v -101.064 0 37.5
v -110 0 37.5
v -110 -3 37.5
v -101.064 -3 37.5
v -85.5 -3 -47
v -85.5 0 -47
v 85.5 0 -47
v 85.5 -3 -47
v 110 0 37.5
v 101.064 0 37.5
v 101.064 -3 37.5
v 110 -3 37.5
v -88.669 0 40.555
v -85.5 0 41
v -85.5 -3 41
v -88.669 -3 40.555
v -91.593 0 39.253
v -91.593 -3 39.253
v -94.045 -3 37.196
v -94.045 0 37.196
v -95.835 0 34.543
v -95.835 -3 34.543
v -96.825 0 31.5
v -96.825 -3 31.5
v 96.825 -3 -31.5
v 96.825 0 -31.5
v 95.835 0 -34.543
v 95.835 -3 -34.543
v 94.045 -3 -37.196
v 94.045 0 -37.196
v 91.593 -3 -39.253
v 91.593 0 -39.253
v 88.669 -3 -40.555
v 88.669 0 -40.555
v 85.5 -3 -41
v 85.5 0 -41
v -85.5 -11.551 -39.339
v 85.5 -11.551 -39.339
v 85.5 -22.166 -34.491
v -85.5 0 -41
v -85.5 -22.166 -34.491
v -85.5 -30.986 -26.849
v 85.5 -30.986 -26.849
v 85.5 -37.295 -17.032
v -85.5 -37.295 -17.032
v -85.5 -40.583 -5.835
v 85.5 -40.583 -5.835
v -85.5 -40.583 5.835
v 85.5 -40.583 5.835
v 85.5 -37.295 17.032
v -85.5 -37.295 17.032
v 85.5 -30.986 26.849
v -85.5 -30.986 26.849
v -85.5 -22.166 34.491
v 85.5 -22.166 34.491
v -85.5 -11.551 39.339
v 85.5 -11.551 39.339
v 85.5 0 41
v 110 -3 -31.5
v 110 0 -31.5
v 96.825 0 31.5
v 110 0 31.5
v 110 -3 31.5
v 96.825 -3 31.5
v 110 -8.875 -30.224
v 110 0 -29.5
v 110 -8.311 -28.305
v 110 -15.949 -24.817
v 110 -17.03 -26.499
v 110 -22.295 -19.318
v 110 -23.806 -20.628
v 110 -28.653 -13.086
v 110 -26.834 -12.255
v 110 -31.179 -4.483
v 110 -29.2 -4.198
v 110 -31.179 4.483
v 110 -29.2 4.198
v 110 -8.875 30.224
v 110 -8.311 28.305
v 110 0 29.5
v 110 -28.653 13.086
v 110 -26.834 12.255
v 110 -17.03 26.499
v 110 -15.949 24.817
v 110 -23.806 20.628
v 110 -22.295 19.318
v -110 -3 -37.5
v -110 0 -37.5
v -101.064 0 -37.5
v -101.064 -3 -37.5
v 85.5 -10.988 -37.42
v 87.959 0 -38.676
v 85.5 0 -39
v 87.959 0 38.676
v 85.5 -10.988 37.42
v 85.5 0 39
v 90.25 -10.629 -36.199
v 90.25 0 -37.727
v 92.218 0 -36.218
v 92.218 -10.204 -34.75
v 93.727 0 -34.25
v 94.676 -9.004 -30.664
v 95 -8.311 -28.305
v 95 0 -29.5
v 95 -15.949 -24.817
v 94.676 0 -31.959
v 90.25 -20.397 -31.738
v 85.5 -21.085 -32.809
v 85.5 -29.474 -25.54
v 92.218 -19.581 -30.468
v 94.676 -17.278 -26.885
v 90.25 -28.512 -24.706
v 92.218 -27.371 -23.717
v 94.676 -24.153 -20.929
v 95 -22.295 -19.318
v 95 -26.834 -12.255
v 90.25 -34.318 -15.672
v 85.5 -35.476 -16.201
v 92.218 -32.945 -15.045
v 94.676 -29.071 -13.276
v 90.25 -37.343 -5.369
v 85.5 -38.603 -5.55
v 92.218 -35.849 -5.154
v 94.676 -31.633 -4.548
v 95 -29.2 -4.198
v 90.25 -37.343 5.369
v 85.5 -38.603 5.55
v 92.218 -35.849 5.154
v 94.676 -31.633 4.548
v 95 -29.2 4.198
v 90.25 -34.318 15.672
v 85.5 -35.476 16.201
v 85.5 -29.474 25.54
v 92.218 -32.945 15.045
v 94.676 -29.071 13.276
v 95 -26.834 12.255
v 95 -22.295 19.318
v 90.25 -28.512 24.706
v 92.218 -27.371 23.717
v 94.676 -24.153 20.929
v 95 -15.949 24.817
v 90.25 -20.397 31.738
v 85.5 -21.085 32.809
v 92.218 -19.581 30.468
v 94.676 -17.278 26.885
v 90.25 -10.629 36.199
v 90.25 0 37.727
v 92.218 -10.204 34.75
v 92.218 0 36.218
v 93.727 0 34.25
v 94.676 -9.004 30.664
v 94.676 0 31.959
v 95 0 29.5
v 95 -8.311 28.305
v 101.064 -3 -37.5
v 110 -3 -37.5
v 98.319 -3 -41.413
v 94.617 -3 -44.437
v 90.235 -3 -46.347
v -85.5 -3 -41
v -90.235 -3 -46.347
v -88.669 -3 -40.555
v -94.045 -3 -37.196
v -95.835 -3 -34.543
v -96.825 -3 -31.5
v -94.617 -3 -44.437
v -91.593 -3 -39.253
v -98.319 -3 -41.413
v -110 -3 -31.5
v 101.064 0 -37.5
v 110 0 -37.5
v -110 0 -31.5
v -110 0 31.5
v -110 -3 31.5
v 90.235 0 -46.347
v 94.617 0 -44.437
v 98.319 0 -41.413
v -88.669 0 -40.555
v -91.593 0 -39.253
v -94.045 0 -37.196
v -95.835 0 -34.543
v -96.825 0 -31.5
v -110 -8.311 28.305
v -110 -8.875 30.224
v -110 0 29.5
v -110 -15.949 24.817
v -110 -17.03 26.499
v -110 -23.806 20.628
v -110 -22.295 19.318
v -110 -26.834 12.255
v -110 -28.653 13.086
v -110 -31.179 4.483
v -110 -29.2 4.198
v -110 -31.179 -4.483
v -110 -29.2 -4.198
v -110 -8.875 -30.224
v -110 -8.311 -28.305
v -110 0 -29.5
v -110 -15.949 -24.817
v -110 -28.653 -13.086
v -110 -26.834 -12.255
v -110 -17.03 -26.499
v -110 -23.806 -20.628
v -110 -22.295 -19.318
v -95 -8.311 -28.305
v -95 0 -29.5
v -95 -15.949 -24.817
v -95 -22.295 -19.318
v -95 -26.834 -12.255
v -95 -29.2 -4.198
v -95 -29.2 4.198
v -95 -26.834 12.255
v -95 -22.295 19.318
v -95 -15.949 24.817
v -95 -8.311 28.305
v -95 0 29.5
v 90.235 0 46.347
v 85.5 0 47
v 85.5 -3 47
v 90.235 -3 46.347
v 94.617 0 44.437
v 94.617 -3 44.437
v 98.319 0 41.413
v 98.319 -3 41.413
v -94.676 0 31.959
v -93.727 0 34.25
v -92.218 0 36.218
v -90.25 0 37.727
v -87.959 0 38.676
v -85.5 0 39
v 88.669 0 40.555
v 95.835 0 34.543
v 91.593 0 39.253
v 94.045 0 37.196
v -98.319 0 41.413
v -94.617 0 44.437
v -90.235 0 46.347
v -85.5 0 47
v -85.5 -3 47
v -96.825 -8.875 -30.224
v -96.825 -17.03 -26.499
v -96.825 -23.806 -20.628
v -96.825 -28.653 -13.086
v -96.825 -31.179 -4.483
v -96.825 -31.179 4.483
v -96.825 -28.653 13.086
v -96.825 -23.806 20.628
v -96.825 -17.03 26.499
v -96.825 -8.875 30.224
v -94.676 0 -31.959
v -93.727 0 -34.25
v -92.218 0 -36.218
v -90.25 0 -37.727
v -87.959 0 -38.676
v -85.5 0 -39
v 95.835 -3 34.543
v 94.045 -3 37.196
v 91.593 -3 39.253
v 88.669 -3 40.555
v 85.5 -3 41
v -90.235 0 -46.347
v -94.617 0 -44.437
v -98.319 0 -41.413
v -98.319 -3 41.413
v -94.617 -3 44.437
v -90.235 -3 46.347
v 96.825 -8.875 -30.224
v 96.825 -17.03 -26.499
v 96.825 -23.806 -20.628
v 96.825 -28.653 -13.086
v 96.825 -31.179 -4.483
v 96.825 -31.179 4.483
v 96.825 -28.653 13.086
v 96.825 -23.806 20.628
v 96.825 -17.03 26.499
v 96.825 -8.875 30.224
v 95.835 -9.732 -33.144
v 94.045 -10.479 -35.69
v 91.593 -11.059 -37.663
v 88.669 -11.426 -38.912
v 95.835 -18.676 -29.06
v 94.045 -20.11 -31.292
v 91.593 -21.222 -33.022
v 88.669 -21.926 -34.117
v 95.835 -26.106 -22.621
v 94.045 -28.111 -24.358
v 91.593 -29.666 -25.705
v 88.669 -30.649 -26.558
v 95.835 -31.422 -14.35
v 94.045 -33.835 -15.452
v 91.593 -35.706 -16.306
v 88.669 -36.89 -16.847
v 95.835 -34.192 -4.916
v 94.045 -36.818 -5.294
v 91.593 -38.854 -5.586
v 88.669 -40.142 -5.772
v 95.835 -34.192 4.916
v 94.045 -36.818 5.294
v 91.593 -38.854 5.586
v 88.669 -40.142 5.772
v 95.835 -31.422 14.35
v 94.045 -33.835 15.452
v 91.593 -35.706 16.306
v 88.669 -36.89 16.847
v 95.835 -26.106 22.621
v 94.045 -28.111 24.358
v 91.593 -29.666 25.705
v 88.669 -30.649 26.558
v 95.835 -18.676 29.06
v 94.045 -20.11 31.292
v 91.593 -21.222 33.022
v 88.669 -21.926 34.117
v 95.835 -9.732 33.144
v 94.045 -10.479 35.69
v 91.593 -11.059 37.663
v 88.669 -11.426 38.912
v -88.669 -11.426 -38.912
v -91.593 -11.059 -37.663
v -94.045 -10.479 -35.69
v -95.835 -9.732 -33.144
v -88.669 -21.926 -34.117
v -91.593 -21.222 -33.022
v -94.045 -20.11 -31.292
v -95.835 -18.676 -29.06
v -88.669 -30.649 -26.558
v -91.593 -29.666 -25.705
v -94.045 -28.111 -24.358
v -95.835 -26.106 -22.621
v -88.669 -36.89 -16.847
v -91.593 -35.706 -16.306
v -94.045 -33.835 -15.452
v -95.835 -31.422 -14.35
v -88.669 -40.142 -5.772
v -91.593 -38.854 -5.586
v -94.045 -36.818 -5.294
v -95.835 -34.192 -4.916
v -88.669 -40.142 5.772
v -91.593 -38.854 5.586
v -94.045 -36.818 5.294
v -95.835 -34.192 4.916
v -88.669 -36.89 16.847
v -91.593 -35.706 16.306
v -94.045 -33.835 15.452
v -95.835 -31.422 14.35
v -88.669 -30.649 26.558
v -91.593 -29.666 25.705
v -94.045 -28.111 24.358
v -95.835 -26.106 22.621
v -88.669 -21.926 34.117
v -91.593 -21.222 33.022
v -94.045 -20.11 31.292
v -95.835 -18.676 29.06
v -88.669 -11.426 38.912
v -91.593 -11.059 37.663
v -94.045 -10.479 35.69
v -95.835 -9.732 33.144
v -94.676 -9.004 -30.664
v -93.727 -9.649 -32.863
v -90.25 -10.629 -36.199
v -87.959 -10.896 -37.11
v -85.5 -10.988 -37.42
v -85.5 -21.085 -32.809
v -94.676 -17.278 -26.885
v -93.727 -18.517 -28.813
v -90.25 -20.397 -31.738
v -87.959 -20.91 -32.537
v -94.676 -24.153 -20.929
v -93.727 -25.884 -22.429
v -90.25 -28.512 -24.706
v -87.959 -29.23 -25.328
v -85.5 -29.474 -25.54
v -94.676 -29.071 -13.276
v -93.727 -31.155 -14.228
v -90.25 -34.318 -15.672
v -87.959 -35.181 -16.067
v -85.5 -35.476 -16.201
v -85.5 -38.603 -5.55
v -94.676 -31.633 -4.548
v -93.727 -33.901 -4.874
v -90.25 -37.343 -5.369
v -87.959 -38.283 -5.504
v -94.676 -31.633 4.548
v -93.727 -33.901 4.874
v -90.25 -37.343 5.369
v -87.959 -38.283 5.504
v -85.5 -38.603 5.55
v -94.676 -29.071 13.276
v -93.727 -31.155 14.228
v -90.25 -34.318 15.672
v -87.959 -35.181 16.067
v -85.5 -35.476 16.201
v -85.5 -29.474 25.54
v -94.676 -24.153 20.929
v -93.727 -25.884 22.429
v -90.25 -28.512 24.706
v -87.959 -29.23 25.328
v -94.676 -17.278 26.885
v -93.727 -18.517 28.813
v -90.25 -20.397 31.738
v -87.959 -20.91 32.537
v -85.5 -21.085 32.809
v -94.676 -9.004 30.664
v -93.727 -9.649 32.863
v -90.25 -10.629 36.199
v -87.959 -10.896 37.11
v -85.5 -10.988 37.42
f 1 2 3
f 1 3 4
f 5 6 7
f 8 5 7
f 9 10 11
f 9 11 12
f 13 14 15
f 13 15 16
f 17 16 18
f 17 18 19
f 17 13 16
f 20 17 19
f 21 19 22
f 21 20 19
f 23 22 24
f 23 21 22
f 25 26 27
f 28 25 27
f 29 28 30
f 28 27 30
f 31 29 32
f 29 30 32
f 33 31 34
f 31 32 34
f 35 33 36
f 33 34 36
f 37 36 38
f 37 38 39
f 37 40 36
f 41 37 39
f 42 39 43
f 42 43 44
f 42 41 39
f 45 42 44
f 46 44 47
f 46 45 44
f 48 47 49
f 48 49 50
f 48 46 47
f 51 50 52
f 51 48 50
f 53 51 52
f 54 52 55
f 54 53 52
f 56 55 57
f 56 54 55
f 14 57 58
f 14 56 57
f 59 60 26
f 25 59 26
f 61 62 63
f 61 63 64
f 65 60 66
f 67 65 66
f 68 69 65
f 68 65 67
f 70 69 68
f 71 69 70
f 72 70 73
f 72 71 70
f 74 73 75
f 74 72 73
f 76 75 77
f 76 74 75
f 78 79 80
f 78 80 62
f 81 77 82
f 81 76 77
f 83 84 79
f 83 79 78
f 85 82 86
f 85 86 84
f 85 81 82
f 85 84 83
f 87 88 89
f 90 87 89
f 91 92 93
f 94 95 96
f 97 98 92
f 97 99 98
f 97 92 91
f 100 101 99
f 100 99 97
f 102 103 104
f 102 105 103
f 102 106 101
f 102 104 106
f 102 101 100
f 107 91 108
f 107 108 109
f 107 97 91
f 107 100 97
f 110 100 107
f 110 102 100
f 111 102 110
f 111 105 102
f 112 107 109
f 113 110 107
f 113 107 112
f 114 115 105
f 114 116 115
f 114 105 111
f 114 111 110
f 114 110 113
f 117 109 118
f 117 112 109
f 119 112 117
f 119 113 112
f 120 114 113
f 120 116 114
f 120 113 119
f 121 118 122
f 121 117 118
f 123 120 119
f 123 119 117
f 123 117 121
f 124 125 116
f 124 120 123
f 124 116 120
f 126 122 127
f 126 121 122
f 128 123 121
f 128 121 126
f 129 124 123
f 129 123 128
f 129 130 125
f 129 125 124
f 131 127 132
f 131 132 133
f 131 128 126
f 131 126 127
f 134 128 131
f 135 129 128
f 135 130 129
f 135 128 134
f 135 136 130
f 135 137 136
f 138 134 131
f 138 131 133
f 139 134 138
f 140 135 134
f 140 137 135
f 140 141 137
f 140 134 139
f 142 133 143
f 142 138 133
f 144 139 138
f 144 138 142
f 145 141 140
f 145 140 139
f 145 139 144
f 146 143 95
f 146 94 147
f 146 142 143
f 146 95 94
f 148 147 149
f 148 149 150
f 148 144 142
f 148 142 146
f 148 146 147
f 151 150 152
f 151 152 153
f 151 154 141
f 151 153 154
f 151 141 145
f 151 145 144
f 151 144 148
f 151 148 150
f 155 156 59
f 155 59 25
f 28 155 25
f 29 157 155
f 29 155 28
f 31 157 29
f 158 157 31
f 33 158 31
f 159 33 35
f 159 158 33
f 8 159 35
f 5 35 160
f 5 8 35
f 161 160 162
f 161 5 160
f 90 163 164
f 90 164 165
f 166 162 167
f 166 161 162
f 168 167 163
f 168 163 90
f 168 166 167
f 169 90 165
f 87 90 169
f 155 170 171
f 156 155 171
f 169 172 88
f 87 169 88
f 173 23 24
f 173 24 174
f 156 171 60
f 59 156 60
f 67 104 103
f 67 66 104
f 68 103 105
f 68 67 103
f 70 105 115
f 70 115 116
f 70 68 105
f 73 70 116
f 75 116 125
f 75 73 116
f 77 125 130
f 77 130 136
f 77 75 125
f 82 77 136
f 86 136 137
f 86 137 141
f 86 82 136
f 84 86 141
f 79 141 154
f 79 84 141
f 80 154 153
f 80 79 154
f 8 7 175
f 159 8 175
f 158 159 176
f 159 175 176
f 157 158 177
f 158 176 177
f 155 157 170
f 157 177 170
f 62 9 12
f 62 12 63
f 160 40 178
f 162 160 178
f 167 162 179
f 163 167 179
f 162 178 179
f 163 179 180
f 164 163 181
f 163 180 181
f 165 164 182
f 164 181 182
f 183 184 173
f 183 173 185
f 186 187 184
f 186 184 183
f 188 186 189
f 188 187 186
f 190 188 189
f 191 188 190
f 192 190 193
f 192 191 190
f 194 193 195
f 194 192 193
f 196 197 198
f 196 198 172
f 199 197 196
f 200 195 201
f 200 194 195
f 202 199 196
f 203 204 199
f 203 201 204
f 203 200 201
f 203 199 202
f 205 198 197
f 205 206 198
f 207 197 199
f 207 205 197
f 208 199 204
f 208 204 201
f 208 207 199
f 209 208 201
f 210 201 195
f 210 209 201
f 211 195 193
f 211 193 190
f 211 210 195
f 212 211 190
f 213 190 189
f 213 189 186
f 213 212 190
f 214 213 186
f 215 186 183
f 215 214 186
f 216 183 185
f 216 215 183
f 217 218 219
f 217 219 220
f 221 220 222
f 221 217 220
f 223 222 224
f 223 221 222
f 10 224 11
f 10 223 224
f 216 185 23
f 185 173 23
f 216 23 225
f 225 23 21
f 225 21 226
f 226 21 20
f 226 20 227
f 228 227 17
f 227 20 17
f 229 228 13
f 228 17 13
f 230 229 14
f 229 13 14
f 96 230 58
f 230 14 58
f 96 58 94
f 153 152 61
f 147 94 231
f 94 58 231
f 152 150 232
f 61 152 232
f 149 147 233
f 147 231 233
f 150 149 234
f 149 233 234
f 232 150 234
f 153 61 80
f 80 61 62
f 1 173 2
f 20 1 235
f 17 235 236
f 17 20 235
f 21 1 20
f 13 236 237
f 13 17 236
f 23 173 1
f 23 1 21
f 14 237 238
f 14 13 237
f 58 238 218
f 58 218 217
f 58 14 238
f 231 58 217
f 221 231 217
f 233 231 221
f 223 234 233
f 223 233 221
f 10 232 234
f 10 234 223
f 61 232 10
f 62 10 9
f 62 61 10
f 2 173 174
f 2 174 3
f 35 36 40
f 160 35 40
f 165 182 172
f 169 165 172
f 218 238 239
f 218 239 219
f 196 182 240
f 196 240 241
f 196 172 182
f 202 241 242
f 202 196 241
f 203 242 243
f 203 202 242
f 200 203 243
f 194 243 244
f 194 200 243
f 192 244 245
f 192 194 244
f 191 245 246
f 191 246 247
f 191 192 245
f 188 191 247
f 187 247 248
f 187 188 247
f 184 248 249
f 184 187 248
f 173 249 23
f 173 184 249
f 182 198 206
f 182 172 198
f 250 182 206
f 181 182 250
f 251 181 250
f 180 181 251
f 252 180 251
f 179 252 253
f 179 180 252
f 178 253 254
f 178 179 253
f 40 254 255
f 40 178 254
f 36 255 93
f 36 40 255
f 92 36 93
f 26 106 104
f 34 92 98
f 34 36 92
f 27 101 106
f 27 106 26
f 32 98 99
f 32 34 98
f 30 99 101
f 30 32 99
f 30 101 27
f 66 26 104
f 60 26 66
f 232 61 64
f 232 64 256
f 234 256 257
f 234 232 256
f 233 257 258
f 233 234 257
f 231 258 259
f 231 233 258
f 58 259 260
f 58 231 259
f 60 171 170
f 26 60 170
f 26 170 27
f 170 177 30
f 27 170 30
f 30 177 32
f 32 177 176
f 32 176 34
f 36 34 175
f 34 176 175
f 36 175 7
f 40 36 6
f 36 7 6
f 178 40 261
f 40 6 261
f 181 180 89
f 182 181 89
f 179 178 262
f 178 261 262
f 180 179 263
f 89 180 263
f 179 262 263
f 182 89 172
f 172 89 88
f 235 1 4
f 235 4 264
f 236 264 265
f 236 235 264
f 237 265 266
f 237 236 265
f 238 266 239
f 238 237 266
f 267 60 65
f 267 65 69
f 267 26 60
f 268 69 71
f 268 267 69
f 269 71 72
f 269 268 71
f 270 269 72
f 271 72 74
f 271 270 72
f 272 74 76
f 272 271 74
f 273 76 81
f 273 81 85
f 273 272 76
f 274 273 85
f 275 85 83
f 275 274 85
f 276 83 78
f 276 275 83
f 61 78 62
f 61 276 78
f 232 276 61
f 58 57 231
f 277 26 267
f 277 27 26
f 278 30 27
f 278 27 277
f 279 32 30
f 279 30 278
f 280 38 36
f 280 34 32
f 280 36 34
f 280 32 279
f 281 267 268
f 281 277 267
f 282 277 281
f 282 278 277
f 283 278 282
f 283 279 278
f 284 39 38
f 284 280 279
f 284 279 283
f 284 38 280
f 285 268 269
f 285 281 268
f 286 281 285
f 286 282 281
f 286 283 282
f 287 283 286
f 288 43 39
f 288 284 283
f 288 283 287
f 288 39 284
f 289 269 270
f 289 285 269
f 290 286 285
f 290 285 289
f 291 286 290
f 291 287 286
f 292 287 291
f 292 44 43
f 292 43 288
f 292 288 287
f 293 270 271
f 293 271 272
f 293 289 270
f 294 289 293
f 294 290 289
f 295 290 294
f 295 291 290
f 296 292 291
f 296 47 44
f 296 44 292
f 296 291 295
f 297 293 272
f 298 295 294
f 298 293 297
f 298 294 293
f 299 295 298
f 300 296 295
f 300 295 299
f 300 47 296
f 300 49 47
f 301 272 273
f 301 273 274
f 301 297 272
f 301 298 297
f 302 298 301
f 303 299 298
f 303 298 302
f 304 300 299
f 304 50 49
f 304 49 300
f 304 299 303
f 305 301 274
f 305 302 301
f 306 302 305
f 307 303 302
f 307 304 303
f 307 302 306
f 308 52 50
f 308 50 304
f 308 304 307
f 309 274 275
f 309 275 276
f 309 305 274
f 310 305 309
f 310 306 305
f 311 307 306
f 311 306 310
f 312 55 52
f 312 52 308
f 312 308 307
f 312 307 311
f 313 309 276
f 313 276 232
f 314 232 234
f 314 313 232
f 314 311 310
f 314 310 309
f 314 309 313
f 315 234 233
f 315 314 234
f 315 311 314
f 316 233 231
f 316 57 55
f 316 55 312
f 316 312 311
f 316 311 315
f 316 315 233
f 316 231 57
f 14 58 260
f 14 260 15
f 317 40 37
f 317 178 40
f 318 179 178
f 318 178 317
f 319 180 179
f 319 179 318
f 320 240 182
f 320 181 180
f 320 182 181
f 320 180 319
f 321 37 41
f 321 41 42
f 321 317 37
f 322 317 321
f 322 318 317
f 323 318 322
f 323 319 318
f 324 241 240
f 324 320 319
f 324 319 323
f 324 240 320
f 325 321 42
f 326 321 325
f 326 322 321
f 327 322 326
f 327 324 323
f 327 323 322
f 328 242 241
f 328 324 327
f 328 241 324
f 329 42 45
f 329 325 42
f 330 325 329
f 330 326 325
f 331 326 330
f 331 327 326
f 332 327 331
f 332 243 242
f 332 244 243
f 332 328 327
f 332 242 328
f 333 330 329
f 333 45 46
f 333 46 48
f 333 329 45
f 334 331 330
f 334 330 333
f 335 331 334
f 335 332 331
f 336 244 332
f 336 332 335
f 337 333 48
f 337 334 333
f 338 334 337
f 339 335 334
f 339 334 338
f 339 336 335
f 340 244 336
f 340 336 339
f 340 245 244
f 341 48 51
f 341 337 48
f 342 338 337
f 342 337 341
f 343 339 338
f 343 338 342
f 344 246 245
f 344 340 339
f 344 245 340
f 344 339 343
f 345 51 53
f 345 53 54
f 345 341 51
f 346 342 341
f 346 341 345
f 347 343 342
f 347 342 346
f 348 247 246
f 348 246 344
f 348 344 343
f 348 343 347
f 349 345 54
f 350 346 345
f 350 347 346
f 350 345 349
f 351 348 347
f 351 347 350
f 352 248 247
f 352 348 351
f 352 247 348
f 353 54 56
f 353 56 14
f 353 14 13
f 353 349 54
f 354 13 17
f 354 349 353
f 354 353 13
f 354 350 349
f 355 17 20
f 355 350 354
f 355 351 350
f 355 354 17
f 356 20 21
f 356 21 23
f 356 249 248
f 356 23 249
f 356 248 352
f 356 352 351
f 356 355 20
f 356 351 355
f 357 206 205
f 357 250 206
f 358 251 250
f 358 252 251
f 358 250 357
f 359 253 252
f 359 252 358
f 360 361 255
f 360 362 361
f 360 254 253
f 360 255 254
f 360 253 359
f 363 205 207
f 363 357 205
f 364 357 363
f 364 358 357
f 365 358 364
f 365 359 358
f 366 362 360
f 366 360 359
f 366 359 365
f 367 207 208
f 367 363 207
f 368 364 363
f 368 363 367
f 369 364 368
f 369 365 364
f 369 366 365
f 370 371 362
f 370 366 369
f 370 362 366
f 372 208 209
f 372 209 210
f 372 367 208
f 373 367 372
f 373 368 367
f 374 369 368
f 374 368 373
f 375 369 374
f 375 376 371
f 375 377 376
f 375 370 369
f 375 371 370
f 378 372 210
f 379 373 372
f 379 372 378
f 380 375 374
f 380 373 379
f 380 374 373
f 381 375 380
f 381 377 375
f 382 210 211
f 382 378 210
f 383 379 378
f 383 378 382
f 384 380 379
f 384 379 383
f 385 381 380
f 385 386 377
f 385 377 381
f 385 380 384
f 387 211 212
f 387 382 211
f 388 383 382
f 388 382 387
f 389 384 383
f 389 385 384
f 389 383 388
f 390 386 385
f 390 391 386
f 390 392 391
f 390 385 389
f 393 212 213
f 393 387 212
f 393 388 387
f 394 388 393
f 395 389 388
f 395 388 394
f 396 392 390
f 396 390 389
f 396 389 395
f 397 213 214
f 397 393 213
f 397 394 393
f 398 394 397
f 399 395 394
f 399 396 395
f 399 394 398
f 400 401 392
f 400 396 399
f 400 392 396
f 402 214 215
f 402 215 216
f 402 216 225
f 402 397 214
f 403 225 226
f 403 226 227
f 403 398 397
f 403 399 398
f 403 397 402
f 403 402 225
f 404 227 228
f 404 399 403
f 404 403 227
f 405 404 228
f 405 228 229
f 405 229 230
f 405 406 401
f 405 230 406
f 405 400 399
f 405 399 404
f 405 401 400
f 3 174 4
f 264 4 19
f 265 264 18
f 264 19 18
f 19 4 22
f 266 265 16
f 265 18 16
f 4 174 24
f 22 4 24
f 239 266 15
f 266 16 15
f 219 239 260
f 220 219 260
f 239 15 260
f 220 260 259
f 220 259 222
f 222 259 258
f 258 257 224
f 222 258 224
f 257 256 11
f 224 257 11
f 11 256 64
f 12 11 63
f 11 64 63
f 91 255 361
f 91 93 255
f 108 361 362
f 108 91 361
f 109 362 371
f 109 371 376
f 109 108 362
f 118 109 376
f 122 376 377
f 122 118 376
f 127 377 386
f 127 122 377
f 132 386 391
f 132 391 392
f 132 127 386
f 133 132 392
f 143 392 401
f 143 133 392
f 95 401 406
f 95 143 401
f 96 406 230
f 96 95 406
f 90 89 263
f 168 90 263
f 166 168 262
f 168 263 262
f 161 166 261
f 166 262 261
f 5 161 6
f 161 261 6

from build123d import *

# Parameters (mm, degrees)
REVOLVE1_ANGLE        = 180
BOSS_EXTRUDE1_DEPTH   = 3
BOSS_EXTRUDE1_2_DEPTH = 3


with BuildPart() as part:
    # Sketch1 → Revolve1 (revolve)
    with BuildSketch(Plane(origin=(0, 0, 0), x_dir=(1, 0, 0), z_dir=(0, 1, 0))):
        with BuildLine():
            Line((-110, 29.5), (-95, 29.5))
            ThreePointArc((-95, 29.5), (-92.217514421, 36.217514421), (-85.5, 39))
            Line((-85.5, 39), (85.5, 39))
            ThreePointArc((85.5, 39), (92.217514421, 36.217514421), (95, 29.5))
            Line((95, 29.5), (110, 29.5))
            Line((110, 29.5), (110, 31.5))
            Line((110, 31.5), (96.824751653, 31.5))
            ThreePointArc((96.824751653, 31.5), (92.89087275, 38.310505093), (85.5, 41))
            Line((85.5, 41), (-85.5, 41))
            ThreePointArc((-85.5, 41), (-92.89087275, 38.310505093), (-96.824751653, 31.5))
            Line((-96.824751653, 31.5), (-110, 31.5))
            Line((-110, 31.5), (-110, 29.5))
        make_face()
    revolve(axis=Axis((0, 0, 0), (-1, 0, 0)), revolution_arc=REVOLVE1_ANGLE)


with BuildPart() as body_2:
    # Sketch2 → Boss-Extrude1 (new body)
    with BuildSketch(Plane(origin=(0, 0, 0), x_dir=(1, 0, 0), z_dir=(0, 1, 0))):
        with BuildLine():
            Line((-96.824751653, 31.5), (-110, 31.5))
            Line((-110, 31.5), (-110, 37.5))
            Line((-110, 37.5), (-101.064382416, 37.5))
            ThreePointArc((-101.064382416, 37.5), (-94.617291264, 44.437369246), (-85.5, 47))
            Line((-85.5, 47), (85.5, 47))
            ThreePointArc((85.5, 47), (94.617291264, 44.437369246), (101.064382416, 37.5))
            Line((101.064382416, 37.5), (110, 37.5))
            Line((110, 37.5), (110, 31.5))
            Line((110, 31.5), (96.824751653, 31.5))
            ThreePointArc((96.824751653, 31.5), (92.89087275, 38.310505093), (85.5, 41))
            Line((85.5, 41), (-85.5, 41))
            ThreePointArc((-85.5, 41), (-92.89087275, 38.310505093), (-96.824751653, 31.5))
        make_face()
    extrude(amount=-BOSS_EXTRUDE1_DEPTH)


with BuildPart() as body_3:
    # Sketch2 → Boss-Extrude1 2 (new body)
    with BuildSketch(Plane(origin=(0, 0, 0), x_dir=(1, 0, 0), z_dir=(0, 1, 0))):
        with BuildLine():
            Line((110, -37.5), (110, -31.5))
            Line((110, -31.5), (96.824751653, -31.5))
            ThreePointArc((96.824751653, -31.5), (92.89087275, -38.310505093), (85.5, -41))
            Line((85.5, -41), (-85.5, -41))
            ThreePointArc((-85.5, -41), (-92.89087275, -38.310505093), (-96.824751653, -31.5))
            Line((-96.824751653, -31.5), (-110, -31.5))
            Line((-110, -31.5), (-110, -37.5))
            Line((-110, -37.5), (-101.064382416, -37.5))
            ThreePointArc((-101.064382416, -37.5), (-94.617291264, -44.437369246), (-85.5, -47))
            Line((-85.5, -47), (85.5, -47))
            ThreePointArc((85.5, -47), (94.617291264, -44.437369246), (101.064382416, -37.5))
            Line((101.064382416, -37.5), (110, -37.5))
        make_face()
    extrude(amount=-BOSS_EXTRUDE1_2_DEPTH)


solid = Compound([part.part, body_2.part, body_3.part])
